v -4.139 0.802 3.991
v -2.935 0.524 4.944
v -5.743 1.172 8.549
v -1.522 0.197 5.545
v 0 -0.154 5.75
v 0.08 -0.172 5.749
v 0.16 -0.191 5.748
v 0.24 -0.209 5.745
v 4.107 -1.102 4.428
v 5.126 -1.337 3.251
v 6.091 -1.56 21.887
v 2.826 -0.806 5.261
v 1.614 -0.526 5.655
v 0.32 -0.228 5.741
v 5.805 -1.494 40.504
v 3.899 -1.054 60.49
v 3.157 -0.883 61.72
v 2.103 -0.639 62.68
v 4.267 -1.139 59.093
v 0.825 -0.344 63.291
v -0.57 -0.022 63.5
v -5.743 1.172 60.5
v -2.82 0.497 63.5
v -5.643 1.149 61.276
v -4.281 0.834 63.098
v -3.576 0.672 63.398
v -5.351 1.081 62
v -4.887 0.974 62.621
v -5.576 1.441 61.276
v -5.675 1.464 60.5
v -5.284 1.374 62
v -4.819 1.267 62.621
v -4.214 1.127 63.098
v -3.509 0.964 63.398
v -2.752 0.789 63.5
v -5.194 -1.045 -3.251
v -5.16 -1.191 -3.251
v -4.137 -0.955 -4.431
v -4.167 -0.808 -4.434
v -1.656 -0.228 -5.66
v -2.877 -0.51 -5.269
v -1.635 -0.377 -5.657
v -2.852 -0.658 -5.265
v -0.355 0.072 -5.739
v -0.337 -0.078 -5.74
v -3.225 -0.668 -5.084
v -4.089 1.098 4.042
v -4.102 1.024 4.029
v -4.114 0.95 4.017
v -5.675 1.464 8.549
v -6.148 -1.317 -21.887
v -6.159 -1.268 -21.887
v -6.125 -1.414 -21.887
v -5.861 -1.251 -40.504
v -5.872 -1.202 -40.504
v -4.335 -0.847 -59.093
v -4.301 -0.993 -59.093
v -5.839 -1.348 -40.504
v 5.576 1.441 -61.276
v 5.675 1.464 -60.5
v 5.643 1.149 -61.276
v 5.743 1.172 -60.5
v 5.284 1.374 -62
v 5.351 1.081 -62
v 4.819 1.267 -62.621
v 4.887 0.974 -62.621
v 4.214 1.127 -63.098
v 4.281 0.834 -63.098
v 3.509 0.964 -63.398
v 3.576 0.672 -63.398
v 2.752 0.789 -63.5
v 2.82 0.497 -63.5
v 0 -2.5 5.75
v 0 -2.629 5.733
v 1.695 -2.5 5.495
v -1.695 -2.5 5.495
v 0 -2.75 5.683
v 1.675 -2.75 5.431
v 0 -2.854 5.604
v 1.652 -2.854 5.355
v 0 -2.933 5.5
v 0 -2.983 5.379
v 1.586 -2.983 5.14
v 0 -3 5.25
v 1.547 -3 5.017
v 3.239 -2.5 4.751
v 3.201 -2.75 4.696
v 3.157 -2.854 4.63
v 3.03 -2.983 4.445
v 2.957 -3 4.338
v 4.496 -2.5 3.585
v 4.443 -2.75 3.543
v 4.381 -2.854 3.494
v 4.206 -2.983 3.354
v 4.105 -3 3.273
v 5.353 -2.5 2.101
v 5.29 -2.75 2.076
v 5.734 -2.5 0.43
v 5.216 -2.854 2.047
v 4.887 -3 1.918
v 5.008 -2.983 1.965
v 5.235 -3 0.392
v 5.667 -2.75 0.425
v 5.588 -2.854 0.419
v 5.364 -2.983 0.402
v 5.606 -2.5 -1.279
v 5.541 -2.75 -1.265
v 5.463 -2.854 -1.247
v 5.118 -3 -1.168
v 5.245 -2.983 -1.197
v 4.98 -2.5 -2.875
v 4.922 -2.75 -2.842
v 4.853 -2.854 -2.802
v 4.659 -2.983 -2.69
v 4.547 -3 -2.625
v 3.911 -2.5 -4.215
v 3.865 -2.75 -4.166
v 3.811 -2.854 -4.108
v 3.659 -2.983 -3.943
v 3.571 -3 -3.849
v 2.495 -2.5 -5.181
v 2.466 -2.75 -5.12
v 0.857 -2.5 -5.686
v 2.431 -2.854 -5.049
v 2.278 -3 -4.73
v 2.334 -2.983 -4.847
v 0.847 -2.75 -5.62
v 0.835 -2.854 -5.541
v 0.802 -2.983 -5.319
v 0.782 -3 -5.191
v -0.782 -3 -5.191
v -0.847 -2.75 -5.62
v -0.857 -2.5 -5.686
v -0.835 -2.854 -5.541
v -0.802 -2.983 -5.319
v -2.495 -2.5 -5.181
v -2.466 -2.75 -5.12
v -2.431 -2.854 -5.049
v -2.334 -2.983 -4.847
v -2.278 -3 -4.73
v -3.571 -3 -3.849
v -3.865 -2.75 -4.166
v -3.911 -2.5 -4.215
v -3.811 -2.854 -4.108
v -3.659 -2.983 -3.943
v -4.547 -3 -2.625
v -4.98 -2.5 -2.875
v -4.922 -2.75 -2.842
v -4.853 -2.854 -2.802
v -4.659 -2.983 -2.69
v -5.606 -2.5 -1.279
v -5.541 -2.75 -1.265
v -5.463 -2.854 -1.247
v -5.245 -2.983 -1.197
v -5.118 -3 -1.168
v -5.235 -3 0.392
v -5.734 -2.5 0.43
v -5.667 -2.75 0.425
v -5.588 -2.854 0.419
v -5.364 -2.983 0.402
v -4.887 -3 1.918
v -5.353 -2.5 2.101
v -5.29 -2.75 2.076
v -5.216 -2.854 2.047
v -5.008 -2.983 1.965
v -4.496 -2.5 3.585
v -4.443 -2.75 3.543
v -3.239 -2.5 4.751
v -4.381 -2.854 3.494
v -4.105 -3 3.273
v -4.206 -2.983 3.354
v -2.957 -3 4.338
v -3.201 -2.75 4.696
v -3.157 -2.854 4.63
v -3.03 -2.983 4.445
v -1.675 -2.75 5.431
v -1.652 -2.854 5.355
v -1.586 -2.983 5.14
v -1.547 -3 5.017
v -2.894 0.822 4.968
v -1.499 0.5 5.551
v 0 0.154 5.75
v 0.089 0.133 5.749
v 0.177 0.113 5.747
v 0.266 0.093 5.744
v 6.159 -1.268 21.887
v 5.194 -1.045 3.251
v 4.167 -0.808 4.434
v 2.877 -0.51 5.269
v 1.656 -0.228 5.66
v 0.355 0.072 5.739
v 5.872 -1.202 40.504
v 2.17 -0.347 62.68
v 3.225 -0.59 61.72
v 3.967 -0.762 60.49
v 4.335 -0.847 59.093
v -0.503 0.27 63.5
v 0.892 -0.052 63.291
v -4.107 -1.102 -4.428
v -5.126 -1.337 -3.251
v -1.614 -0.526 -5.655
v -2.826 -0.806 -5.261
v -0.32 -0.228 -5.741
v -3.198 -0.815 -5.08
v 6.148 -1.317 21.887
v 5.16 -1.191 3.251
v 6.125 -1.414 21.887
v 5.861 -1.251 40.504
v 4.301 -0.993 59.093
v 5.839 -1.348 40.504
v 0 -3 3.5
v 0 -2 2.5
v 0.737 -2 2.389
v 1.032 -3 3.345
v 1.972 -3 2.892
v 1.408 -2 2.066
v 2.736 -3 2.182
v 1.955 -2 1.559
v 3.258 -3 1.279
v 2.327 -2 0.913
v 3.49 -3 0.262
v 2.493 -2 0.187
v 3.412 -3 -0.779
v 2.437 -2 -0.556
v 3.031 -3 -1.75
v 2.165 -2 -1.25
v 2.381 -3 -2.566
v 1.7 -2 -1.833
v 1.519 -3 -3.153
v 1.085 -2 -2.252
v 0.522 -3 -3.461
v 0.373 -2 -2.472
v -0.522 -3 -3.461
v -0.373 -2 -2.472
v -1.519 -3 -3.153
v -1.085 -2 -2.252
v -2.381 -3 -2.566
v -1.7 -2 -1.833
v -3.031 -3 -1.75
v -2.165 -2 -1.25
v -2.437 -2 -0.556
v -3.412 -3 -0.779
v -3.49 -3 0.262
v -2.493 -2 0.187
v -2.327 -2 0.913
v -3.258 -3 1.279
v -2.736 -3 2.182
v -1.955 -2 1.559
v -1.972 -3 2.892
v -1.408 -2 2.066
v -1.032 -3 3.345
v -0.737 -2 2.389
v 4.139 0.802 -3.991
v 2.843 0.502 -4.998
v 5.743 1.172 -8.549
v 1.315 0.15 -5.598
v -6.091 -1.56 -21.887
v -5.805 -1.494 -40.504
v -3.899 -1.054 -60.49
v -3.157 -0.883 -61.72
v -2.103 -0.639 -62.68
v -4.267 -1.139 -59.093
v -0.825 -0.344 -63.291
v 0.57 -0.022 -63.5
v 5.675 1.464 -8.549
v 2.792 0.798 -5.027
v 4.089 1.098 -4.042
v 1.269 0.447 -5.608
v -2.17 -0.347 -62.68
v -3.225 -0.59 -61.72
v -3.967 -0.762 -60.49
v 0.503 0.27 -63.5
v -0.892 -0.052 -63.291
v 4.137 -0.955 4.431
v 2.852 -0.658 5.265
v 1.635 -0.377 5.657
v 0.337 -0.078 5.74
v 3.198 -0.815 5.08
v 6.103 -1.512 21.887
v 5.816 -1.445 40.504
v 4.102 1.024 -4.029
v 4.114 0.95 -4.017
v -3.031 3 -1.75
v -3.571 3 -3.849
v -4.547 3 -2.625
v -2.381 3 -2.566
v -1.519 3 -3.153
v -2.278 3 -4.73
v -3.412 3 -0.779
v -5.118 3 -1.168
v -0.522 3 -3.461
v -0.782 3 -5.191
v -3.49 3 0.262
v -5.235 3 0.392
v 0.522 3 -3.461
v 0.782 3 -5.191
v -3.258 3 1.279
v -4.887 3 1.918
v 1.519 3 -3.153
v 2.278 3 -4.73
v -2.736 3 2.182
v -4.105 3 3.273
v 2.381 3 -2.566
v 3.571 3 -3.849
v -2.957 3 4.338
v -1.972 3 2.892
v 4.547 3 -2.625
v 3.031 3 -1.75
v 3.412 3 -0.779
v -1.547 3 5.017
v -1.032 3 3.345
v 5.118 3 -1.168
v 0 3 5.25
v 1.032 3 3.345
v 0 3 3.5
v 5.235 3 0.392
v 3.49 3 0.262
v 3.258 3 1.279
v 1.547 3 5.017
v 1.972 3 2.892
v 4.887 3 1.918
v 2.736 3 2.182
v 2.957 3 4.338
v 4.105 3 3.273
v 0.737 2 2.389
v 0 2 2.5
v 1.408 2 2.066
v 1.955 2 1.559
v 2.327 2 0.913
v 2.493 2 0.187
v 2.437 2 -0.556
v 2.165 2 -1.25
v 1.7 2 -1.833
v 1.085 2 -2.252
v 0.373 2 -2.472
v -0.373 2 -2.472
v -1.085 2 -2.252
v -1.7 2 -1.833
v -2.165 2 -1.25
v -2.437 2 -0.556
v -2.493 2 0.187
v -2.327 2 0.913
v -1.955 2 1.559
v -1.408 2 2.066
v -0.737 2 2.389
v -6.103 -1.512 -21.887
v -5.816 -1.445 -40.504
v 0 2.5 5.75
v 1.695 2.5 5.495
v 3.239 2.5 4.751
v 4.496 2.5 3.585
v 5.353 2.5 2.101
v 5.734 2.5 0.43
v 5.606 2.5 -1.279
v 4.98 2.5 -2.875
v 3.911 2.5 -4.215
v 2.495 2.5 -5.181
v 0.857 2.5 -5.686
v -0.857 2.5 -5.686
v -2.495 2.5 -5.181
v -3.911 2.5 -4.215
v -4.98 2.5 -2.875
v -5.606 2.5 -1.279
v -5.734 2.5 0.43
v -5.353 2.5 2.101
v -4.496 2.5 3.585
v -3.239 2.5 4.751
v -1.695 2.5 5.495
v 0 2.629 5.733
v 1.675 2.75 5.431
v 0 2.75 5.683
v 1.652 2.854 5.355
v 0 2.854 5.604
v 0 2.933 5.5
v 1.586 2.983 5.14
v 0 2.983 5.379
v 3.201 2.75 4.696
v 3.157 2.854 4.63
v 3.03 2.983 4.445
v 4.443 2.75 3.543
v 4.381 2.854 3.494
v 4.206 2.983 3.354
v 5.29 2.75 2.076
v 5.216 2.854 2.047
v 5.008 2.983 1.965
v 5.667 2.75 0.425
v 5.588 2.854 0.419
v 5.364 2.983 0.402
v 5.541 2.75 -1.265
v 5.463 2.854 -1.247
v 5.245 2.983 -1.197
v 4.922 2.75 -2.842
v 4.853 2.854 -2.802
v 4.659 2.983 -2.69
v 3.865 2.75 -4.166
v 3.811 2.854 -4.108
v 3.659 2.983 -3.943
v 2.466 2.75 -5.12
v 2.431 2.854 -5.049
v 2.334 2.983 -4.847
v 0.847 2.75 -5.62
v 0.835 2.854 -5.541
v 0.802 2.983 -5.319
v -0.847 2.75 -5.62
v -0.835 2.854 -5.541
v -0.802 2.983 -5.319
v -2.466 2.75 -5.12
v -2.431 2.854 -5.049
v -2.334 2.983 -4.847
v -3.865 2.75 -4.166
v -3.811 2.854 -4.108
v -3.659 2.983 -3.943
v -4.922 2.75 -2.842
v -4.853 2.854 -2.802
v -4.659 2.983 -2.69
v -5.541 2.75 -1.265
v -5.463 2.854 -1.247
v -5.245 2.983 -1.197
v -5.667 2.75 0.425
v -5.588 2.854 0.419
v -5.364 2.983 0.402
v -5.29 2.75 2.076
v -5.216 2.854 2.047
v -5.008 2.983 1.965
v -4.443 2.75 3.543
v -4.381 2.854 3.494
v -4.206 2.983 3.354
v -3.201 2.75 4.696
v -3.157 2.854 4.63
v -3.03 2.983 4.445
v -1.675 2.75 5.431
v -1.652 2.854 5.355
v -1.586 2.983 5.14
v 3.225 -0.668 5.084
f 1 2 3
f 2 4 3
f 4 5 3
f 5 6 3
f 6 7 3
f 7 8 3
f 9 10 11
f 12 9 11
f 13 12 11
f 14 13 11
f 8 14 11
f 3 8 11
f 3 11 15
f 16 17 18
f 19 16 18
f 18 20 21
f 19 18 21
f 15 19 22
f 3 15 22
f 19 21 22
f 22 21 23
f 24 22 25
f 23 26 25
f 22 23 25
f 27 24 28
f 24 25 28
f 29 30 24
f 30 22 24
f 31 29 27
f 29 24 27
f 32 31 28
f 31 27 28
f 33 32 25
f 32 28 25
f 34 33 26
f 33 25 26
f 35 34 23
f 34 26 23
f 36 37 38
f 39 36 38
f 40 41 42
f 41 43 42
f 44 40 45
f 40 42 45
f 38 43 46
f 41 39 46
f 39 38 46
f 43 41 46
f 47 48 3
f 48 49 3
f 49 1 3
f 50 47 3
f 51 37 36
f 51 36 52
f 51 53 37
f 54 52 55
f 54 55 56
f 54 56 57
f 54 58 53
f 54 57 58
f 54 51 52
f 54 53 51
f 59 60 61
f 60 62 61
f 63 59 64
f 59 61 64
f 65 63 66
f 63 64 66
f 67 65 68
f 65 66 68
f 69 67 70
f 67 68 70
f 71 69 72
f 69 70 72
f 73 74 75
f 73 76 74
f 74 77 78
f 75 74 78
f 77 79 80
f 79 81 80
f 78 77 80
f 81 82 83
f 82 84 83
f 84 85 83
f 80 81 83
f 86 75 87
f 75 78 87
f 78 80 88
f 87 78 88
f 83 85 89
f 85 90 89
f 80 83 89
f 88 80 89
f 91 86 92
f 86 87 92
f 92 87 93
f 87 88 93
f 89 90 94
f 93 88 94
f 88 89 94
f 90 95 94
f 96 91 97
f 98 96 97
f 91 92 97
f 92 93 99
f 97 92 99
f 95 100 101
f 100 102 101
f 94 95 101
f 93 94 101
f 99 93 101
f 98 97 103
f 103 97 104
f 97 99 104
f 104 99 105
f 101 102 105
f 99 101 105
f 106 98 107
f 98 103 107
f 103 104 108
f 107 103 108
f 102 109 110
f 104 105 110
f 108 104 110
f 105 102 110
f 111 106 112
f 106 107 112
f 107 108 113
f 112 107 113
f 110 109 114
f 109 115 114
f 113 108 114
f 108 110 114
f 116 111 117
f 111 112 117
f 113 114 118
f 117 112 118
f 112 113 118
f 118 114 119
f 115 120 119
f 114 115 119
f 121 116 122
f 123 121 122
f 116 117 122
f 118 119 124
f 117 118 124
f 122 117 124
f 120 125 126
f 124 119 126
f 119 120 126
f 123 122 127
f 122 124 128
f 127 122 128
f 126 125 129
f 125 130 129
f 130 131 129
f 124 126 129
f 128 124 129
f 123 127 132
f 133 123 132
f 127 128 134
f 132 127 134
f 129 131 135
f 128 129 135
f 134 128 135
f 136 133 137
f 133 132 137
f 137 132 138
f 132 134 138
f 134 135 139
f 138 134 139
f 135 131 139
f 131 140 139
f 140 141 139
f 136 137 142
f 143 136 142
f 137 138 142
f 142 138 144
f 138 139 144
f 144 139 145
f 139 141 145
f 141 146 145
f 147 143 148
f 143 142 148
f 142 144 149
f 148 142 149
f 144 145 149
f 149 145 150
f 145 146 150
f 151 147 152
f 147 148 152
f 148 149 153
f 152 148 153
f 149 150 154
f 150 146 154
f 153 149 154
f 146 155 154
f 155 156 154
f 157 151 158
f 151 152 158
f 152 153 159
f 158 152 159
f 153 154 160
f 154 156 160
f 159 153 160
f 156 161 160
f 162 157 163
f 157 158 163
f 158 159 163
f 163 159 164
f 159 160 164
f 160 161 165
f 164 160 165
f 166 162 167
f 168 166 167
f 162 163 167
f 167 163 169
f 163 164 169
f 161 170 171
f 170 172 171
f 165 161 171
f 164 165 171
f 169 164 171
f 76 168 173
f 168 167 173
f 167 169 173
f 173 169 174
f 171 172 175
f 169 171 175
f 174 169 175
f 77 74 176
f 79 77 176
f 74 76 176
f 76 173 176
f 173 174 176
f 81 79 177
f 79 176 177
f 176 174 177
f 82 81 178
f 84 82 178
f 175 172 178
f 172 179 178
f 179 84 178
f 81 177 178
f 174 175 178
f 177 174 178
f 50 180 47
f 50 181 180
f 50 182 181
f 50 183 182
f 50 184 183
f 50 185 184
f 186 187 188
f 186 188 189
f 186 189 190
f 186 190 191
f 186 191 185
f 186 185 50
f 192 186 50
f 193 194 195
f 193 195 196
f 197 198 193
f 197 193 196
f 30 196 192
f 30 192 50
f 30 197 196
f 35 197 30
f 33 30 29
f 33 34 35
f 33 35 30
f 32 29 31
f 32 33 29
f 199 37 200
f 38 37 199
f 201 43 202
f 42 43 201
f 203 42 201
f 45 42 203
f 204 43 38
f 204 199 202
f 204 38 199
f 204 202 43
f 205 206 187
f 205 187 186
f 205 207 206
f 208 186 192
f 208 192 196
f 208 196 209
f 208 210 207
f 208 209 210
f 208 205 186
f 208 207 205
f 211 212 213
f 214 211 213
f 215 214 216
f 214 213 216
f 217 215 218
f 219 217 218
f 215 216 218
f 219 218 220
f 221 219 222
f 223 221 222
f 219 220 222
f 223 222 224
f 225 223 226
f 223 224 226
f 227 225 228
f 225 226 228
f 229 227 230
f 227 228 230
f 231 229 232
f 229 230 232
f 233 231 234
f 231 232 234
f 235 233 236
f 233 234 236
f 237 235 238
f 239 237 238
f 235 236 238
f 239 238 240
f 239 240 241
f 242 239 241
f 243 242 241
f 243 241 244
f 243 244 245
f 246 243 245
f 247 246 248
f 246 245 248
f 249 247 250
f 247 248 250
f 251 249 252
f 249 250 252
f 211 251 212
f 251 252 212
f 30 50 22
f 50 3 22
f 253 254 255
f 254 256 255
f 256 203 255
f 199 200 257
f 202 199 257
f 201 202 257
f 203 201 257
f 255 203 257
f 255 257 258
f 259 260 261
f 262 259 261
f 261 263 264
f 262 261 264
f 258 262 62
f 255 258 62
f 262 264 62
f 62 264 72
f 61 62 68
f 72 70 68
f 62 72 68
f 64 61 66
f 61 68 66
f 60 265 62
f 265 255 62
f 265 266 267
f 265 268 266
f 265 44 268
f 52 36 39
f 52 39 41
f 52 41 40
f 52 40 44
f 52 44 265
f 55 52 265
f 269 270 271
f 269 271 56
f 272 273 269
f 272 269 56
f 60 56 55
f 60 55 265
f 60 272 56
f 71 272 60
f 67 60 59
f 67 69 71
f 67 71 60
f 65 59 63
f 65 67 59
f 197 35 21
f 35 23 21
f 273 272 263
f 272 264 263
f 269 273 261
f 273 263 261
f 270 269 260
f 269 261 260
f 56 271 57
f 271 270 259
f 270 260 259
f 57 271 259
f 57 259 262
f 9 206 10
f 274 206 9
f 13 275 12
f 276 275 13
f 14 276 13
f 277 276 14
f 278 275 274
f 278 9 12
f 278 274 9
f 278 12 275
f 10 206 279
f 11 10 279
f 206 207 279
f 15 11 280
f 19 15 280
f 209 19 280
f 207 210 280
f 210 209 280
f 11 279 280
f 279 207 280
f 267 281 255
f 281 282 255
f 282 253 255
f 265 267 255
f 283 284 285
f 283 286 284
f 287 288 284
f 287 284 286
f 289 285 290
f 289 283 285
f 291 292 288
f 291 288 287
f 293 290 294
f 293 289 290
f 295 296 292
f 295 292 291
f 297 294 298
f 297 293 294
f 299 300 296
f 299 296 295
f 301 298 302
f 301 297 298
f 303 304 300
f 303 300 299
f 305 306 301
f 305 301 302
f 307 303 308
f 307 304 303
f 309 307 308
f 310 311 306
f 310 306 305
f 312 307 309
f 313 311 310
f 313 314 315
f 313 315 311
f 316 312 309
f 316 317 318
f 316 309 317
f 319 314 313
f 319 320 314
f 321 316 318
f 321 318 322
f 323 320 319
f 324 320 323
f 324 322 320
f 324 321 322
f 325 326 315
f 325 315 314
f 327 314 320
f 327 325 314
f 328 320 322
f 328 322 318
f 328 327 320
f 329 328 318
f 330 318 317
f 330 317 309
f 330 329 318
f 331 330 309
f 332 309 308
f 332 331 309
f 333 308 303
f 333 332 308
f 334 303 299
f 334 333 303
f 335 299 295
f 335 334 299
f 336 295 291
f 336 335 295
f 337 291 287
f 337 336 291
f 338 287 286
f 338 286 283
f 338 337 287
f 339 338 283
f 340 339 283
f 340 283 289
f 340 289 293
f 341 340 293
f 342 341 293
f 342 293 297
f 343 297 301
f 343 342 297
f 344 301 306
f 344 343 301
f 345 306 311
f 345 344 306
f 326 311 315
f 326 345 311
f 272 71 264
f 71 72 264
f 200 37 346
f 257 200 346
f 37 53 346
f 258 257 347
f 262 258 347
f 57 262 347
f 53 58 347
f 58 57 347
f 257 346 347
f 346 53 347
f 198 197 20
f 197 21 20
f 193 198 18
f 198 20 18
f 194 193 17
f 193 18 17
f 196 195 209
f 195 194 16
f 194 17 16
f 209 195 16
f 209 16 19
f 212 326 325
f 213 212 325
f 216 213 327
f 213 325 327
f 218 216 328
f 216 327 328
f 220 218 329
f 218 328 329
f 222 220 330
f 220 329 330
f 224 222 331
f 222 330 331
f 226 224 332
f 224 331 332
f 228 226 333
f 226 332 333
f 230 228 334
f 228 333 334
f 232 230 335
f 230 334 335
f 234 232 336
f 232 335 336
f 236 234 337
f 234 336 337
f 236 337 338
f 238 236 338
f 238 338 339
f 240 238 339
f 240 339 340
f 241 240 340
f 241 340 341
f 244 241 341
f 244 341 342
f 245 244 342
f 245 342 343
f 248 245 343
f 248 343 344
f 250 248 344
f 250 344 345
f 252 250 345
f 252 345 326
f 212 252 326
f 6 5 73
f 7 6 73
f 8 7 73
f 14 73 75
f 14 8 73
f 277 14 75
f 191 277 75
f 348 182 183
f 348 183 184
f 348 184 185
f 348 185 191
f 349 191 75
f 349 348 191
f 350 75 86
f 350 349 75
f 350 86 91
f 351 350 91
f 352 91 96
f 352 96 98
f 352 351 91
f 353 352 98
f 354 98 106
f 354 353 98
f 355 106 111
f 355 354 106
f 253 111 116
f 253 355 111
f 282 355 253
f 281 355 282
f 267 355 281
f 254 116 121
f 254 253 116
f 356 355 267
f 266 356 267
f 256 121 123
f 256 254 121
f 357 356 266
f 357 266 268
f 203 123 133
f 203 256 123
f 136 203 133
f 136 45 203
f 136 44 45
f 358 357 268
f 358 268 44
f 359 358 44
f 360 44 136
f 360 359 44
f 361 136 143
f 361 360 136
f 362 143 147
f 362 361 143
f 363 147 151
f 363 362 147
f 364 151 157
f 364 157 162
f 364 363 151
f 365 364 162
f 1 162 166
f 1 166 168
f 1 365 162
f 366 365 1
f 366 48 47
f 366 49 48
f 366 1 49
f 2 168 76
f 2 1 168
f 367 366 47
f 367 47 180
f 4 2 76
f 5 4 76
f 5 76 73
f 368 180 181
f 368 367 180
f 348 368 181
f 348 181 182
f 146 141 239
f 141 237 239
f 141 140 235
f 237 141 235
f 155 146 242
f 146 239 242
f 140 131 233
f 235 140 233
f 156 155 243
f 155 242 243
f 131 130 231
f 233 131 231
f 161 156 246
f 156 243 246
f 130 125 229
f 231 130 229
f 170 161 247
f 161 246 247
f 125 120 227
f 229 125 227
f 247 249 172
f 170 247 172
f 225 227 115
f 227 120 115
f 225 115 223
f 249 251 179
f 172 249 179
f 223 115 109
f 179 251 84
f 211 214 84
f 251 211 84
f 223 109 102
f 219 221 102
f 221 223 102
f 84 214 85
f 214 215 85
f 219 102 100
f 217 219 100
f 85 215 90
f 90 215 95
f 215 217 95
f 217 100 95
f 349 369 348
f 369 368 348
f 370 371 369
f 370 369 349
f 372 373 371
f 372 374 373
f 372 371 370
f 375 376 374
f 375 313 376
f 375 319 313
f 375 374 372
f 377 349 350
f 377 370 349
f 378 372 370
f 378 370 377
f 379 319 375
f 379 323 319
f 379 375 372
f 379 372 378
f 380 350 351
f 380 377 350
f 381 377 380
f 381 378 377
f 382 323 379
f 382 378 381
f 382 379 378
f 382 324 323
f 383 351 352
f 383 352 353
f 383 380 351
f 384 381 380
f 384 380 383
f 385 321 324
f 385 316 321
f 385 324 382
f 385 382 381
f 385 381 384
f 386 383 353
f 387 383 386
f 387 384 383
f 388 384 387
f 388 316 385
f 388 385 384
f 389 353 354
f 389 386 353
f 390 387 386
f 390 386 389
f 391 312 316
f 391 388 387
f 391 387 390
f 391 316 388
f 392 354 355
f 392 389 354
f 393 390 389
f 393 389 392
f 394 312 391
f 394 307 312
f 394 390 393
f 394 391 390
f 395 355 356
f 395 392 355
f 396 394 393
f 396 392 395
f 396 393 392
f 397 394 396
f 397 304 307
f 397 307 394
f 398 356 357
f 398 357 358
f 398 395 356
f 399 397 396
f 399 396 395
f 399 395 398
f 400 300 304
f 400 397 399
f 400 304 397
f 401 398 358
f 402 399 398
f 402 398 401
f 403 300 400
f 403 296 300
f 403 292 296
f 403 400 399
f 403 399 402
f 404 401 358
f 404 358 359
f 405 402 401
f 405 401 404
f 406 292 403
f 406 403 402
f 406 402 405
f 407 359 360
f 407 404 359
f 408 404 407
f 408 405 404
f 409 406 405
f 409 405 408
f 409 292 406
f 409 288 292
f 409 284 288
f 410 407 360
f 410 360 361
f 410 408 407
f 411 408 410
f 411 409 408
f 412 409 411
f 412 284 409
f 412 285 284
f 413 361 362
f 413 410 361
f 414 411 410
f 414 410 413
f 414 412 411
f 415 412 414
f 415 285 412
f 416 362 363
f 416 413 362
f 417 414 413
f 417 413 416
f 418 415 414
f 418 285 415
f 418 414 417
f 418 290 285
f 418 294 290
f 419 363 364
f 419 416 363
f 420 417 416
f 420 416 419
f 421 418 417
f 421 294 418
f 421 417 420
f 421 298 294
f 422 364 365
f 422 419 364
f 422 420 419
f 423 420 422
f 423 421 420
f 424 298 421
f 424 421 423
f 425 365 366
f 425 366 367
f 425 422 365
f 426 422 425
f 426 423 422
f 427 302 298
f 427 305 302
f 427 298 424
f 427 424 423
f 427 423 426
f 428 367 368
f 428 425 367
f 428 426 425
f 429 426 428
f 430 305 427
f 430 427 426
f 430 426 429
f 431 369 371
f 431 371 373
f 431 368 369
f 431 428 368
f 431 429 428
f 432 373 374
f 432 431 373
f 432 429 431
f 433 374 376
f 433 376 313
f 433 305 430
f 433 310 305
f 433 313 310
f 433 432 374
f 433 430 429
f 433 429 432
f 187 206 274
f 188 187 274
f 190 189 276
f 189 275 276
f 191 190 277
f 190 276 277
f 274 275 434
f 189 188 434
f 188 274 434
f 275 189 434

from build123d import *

# Parameters (mm, degrees)
SKETCH1_R           = 5.75
BOSS_EXTRUDE1_DEPTH = 3
BOSS_EXTRUDE2_DEPTH = 0.15
CIRPATTERN1_COUNT   = 2
SKETCH4_R           = 2.5
CUT_EXTRUDE1_DEPTH  = 65.083925427
FILLET1_R           = 0.5
CHAMFER1_SIZE       = 1


with BuildPart() as part:
    # Sketch1 → Boss-Extrude1 (new, symmetric)
    with BuildSketch(Plane(origin=(0, 0, 0), x_dir=(1, 0, 0), z_dir=(0, 1, 0))):
        with Locations(Location((0, 0, 0), (0, 0, 270))):
            Circle(SKETCH1_R)
    extrude(amount=BOSS_EXTRUDE1_DEPTH, both=True)

    # Sketch3 → Boss-Extrude2 (add, symmetric)
    with BuildSketch(Plane(origin=(0, 0, 0), x_dir=(0.9743700647852351, -0.22495105434386545, 0), z_dir=(-0.22495105434386545, -0.9743700647852351, 0))):
        with BuildLine():
            Line((-3.946096789, 3.251337345), (-5.859151844, 8.548605509))
            Line((-5.859151844, 8.548605509), (-5.859151844, 60.5))
            ThreePointArc((-5.859151844, 60.5), (-4.980472188, 62.621320344), (-2.859151844, 63.5))
            Line((-2.859151844, 63.5), (-0.550434398, 63.5))
            ThreePointArc((-0.550434398, 63.5), (2.768651687, 62.239474236), (4.414220363, 59.093467024))
            add(Edge.make_bspline(
                [(5.295803115, 3.251337345), (6.928408565, 21.891598877), (6.634212966, 40.522095073), (4.414220363, 59.093467024)],
                knots=[0, 0, 0, 0, 0.926692818, 0.926692818, 0.926692818, 0.926692818], degree=3))
            add(Edge.make_bspline(
                [(5.295803115, 3.251337345), (0.674853163, 10.168892518), (-3.946096789, 3.251337345)],
                knots=[5.313367698, 5.313367698, 5.313367698, 7.253002917, 7.253002917, 7.253002917], degree=2, weights=[1, 0.565449973, 1]))
        make_face()
    boss_extrude2 = extrude(amount=BOSS_EXTRUDE2_DEPTH, both=True)

    # CirPattern1: Boss-Extrude2 ×2 about axis
    cirpattern1_axis = Axis((0, 3, 0), (0, 1, 0))
    for i in range(1, CIRPATTERN1_COUNT):
        add(boss_extrude2.rotate(cirpattern1_axis, i * 360 / CIRPATTERN1_COUNT))

    # Sketch4 → Cut-Extrude1 (cut, through all)
    with BuildSketch(Plane(origin=(0, 3, 0), x_dir=(1, 0, 0), z_dir=(0, 1, 0))):
        with Locations(Location((0, 0, 0), (0, 0, 270))):
            Circle(SKETCH4_R)
    extrude(amount=-CUT_EXTRUDE1_DEPTH, mode=Mode.SUBTRACT)

    # Fillet1
    fillet1_edges = [part.edges().sort_by_distance(p)[0] for p in [
        (0, -3, -5.75),
        (0, 3, -5.75),
    ]]
    fillet(fillet1_edges, radius=FILLET1_R)

    # Chamfer1
    chamfer1_edges = [part.edges().sort_by_distance(p)[0] for p in [
        (0, -3, -2.5),
        (0, 3, -2.5),
    ]]
    chamfer(chamfer1_edges, length=CHAMFER1_SIZE)


solid = part.part
